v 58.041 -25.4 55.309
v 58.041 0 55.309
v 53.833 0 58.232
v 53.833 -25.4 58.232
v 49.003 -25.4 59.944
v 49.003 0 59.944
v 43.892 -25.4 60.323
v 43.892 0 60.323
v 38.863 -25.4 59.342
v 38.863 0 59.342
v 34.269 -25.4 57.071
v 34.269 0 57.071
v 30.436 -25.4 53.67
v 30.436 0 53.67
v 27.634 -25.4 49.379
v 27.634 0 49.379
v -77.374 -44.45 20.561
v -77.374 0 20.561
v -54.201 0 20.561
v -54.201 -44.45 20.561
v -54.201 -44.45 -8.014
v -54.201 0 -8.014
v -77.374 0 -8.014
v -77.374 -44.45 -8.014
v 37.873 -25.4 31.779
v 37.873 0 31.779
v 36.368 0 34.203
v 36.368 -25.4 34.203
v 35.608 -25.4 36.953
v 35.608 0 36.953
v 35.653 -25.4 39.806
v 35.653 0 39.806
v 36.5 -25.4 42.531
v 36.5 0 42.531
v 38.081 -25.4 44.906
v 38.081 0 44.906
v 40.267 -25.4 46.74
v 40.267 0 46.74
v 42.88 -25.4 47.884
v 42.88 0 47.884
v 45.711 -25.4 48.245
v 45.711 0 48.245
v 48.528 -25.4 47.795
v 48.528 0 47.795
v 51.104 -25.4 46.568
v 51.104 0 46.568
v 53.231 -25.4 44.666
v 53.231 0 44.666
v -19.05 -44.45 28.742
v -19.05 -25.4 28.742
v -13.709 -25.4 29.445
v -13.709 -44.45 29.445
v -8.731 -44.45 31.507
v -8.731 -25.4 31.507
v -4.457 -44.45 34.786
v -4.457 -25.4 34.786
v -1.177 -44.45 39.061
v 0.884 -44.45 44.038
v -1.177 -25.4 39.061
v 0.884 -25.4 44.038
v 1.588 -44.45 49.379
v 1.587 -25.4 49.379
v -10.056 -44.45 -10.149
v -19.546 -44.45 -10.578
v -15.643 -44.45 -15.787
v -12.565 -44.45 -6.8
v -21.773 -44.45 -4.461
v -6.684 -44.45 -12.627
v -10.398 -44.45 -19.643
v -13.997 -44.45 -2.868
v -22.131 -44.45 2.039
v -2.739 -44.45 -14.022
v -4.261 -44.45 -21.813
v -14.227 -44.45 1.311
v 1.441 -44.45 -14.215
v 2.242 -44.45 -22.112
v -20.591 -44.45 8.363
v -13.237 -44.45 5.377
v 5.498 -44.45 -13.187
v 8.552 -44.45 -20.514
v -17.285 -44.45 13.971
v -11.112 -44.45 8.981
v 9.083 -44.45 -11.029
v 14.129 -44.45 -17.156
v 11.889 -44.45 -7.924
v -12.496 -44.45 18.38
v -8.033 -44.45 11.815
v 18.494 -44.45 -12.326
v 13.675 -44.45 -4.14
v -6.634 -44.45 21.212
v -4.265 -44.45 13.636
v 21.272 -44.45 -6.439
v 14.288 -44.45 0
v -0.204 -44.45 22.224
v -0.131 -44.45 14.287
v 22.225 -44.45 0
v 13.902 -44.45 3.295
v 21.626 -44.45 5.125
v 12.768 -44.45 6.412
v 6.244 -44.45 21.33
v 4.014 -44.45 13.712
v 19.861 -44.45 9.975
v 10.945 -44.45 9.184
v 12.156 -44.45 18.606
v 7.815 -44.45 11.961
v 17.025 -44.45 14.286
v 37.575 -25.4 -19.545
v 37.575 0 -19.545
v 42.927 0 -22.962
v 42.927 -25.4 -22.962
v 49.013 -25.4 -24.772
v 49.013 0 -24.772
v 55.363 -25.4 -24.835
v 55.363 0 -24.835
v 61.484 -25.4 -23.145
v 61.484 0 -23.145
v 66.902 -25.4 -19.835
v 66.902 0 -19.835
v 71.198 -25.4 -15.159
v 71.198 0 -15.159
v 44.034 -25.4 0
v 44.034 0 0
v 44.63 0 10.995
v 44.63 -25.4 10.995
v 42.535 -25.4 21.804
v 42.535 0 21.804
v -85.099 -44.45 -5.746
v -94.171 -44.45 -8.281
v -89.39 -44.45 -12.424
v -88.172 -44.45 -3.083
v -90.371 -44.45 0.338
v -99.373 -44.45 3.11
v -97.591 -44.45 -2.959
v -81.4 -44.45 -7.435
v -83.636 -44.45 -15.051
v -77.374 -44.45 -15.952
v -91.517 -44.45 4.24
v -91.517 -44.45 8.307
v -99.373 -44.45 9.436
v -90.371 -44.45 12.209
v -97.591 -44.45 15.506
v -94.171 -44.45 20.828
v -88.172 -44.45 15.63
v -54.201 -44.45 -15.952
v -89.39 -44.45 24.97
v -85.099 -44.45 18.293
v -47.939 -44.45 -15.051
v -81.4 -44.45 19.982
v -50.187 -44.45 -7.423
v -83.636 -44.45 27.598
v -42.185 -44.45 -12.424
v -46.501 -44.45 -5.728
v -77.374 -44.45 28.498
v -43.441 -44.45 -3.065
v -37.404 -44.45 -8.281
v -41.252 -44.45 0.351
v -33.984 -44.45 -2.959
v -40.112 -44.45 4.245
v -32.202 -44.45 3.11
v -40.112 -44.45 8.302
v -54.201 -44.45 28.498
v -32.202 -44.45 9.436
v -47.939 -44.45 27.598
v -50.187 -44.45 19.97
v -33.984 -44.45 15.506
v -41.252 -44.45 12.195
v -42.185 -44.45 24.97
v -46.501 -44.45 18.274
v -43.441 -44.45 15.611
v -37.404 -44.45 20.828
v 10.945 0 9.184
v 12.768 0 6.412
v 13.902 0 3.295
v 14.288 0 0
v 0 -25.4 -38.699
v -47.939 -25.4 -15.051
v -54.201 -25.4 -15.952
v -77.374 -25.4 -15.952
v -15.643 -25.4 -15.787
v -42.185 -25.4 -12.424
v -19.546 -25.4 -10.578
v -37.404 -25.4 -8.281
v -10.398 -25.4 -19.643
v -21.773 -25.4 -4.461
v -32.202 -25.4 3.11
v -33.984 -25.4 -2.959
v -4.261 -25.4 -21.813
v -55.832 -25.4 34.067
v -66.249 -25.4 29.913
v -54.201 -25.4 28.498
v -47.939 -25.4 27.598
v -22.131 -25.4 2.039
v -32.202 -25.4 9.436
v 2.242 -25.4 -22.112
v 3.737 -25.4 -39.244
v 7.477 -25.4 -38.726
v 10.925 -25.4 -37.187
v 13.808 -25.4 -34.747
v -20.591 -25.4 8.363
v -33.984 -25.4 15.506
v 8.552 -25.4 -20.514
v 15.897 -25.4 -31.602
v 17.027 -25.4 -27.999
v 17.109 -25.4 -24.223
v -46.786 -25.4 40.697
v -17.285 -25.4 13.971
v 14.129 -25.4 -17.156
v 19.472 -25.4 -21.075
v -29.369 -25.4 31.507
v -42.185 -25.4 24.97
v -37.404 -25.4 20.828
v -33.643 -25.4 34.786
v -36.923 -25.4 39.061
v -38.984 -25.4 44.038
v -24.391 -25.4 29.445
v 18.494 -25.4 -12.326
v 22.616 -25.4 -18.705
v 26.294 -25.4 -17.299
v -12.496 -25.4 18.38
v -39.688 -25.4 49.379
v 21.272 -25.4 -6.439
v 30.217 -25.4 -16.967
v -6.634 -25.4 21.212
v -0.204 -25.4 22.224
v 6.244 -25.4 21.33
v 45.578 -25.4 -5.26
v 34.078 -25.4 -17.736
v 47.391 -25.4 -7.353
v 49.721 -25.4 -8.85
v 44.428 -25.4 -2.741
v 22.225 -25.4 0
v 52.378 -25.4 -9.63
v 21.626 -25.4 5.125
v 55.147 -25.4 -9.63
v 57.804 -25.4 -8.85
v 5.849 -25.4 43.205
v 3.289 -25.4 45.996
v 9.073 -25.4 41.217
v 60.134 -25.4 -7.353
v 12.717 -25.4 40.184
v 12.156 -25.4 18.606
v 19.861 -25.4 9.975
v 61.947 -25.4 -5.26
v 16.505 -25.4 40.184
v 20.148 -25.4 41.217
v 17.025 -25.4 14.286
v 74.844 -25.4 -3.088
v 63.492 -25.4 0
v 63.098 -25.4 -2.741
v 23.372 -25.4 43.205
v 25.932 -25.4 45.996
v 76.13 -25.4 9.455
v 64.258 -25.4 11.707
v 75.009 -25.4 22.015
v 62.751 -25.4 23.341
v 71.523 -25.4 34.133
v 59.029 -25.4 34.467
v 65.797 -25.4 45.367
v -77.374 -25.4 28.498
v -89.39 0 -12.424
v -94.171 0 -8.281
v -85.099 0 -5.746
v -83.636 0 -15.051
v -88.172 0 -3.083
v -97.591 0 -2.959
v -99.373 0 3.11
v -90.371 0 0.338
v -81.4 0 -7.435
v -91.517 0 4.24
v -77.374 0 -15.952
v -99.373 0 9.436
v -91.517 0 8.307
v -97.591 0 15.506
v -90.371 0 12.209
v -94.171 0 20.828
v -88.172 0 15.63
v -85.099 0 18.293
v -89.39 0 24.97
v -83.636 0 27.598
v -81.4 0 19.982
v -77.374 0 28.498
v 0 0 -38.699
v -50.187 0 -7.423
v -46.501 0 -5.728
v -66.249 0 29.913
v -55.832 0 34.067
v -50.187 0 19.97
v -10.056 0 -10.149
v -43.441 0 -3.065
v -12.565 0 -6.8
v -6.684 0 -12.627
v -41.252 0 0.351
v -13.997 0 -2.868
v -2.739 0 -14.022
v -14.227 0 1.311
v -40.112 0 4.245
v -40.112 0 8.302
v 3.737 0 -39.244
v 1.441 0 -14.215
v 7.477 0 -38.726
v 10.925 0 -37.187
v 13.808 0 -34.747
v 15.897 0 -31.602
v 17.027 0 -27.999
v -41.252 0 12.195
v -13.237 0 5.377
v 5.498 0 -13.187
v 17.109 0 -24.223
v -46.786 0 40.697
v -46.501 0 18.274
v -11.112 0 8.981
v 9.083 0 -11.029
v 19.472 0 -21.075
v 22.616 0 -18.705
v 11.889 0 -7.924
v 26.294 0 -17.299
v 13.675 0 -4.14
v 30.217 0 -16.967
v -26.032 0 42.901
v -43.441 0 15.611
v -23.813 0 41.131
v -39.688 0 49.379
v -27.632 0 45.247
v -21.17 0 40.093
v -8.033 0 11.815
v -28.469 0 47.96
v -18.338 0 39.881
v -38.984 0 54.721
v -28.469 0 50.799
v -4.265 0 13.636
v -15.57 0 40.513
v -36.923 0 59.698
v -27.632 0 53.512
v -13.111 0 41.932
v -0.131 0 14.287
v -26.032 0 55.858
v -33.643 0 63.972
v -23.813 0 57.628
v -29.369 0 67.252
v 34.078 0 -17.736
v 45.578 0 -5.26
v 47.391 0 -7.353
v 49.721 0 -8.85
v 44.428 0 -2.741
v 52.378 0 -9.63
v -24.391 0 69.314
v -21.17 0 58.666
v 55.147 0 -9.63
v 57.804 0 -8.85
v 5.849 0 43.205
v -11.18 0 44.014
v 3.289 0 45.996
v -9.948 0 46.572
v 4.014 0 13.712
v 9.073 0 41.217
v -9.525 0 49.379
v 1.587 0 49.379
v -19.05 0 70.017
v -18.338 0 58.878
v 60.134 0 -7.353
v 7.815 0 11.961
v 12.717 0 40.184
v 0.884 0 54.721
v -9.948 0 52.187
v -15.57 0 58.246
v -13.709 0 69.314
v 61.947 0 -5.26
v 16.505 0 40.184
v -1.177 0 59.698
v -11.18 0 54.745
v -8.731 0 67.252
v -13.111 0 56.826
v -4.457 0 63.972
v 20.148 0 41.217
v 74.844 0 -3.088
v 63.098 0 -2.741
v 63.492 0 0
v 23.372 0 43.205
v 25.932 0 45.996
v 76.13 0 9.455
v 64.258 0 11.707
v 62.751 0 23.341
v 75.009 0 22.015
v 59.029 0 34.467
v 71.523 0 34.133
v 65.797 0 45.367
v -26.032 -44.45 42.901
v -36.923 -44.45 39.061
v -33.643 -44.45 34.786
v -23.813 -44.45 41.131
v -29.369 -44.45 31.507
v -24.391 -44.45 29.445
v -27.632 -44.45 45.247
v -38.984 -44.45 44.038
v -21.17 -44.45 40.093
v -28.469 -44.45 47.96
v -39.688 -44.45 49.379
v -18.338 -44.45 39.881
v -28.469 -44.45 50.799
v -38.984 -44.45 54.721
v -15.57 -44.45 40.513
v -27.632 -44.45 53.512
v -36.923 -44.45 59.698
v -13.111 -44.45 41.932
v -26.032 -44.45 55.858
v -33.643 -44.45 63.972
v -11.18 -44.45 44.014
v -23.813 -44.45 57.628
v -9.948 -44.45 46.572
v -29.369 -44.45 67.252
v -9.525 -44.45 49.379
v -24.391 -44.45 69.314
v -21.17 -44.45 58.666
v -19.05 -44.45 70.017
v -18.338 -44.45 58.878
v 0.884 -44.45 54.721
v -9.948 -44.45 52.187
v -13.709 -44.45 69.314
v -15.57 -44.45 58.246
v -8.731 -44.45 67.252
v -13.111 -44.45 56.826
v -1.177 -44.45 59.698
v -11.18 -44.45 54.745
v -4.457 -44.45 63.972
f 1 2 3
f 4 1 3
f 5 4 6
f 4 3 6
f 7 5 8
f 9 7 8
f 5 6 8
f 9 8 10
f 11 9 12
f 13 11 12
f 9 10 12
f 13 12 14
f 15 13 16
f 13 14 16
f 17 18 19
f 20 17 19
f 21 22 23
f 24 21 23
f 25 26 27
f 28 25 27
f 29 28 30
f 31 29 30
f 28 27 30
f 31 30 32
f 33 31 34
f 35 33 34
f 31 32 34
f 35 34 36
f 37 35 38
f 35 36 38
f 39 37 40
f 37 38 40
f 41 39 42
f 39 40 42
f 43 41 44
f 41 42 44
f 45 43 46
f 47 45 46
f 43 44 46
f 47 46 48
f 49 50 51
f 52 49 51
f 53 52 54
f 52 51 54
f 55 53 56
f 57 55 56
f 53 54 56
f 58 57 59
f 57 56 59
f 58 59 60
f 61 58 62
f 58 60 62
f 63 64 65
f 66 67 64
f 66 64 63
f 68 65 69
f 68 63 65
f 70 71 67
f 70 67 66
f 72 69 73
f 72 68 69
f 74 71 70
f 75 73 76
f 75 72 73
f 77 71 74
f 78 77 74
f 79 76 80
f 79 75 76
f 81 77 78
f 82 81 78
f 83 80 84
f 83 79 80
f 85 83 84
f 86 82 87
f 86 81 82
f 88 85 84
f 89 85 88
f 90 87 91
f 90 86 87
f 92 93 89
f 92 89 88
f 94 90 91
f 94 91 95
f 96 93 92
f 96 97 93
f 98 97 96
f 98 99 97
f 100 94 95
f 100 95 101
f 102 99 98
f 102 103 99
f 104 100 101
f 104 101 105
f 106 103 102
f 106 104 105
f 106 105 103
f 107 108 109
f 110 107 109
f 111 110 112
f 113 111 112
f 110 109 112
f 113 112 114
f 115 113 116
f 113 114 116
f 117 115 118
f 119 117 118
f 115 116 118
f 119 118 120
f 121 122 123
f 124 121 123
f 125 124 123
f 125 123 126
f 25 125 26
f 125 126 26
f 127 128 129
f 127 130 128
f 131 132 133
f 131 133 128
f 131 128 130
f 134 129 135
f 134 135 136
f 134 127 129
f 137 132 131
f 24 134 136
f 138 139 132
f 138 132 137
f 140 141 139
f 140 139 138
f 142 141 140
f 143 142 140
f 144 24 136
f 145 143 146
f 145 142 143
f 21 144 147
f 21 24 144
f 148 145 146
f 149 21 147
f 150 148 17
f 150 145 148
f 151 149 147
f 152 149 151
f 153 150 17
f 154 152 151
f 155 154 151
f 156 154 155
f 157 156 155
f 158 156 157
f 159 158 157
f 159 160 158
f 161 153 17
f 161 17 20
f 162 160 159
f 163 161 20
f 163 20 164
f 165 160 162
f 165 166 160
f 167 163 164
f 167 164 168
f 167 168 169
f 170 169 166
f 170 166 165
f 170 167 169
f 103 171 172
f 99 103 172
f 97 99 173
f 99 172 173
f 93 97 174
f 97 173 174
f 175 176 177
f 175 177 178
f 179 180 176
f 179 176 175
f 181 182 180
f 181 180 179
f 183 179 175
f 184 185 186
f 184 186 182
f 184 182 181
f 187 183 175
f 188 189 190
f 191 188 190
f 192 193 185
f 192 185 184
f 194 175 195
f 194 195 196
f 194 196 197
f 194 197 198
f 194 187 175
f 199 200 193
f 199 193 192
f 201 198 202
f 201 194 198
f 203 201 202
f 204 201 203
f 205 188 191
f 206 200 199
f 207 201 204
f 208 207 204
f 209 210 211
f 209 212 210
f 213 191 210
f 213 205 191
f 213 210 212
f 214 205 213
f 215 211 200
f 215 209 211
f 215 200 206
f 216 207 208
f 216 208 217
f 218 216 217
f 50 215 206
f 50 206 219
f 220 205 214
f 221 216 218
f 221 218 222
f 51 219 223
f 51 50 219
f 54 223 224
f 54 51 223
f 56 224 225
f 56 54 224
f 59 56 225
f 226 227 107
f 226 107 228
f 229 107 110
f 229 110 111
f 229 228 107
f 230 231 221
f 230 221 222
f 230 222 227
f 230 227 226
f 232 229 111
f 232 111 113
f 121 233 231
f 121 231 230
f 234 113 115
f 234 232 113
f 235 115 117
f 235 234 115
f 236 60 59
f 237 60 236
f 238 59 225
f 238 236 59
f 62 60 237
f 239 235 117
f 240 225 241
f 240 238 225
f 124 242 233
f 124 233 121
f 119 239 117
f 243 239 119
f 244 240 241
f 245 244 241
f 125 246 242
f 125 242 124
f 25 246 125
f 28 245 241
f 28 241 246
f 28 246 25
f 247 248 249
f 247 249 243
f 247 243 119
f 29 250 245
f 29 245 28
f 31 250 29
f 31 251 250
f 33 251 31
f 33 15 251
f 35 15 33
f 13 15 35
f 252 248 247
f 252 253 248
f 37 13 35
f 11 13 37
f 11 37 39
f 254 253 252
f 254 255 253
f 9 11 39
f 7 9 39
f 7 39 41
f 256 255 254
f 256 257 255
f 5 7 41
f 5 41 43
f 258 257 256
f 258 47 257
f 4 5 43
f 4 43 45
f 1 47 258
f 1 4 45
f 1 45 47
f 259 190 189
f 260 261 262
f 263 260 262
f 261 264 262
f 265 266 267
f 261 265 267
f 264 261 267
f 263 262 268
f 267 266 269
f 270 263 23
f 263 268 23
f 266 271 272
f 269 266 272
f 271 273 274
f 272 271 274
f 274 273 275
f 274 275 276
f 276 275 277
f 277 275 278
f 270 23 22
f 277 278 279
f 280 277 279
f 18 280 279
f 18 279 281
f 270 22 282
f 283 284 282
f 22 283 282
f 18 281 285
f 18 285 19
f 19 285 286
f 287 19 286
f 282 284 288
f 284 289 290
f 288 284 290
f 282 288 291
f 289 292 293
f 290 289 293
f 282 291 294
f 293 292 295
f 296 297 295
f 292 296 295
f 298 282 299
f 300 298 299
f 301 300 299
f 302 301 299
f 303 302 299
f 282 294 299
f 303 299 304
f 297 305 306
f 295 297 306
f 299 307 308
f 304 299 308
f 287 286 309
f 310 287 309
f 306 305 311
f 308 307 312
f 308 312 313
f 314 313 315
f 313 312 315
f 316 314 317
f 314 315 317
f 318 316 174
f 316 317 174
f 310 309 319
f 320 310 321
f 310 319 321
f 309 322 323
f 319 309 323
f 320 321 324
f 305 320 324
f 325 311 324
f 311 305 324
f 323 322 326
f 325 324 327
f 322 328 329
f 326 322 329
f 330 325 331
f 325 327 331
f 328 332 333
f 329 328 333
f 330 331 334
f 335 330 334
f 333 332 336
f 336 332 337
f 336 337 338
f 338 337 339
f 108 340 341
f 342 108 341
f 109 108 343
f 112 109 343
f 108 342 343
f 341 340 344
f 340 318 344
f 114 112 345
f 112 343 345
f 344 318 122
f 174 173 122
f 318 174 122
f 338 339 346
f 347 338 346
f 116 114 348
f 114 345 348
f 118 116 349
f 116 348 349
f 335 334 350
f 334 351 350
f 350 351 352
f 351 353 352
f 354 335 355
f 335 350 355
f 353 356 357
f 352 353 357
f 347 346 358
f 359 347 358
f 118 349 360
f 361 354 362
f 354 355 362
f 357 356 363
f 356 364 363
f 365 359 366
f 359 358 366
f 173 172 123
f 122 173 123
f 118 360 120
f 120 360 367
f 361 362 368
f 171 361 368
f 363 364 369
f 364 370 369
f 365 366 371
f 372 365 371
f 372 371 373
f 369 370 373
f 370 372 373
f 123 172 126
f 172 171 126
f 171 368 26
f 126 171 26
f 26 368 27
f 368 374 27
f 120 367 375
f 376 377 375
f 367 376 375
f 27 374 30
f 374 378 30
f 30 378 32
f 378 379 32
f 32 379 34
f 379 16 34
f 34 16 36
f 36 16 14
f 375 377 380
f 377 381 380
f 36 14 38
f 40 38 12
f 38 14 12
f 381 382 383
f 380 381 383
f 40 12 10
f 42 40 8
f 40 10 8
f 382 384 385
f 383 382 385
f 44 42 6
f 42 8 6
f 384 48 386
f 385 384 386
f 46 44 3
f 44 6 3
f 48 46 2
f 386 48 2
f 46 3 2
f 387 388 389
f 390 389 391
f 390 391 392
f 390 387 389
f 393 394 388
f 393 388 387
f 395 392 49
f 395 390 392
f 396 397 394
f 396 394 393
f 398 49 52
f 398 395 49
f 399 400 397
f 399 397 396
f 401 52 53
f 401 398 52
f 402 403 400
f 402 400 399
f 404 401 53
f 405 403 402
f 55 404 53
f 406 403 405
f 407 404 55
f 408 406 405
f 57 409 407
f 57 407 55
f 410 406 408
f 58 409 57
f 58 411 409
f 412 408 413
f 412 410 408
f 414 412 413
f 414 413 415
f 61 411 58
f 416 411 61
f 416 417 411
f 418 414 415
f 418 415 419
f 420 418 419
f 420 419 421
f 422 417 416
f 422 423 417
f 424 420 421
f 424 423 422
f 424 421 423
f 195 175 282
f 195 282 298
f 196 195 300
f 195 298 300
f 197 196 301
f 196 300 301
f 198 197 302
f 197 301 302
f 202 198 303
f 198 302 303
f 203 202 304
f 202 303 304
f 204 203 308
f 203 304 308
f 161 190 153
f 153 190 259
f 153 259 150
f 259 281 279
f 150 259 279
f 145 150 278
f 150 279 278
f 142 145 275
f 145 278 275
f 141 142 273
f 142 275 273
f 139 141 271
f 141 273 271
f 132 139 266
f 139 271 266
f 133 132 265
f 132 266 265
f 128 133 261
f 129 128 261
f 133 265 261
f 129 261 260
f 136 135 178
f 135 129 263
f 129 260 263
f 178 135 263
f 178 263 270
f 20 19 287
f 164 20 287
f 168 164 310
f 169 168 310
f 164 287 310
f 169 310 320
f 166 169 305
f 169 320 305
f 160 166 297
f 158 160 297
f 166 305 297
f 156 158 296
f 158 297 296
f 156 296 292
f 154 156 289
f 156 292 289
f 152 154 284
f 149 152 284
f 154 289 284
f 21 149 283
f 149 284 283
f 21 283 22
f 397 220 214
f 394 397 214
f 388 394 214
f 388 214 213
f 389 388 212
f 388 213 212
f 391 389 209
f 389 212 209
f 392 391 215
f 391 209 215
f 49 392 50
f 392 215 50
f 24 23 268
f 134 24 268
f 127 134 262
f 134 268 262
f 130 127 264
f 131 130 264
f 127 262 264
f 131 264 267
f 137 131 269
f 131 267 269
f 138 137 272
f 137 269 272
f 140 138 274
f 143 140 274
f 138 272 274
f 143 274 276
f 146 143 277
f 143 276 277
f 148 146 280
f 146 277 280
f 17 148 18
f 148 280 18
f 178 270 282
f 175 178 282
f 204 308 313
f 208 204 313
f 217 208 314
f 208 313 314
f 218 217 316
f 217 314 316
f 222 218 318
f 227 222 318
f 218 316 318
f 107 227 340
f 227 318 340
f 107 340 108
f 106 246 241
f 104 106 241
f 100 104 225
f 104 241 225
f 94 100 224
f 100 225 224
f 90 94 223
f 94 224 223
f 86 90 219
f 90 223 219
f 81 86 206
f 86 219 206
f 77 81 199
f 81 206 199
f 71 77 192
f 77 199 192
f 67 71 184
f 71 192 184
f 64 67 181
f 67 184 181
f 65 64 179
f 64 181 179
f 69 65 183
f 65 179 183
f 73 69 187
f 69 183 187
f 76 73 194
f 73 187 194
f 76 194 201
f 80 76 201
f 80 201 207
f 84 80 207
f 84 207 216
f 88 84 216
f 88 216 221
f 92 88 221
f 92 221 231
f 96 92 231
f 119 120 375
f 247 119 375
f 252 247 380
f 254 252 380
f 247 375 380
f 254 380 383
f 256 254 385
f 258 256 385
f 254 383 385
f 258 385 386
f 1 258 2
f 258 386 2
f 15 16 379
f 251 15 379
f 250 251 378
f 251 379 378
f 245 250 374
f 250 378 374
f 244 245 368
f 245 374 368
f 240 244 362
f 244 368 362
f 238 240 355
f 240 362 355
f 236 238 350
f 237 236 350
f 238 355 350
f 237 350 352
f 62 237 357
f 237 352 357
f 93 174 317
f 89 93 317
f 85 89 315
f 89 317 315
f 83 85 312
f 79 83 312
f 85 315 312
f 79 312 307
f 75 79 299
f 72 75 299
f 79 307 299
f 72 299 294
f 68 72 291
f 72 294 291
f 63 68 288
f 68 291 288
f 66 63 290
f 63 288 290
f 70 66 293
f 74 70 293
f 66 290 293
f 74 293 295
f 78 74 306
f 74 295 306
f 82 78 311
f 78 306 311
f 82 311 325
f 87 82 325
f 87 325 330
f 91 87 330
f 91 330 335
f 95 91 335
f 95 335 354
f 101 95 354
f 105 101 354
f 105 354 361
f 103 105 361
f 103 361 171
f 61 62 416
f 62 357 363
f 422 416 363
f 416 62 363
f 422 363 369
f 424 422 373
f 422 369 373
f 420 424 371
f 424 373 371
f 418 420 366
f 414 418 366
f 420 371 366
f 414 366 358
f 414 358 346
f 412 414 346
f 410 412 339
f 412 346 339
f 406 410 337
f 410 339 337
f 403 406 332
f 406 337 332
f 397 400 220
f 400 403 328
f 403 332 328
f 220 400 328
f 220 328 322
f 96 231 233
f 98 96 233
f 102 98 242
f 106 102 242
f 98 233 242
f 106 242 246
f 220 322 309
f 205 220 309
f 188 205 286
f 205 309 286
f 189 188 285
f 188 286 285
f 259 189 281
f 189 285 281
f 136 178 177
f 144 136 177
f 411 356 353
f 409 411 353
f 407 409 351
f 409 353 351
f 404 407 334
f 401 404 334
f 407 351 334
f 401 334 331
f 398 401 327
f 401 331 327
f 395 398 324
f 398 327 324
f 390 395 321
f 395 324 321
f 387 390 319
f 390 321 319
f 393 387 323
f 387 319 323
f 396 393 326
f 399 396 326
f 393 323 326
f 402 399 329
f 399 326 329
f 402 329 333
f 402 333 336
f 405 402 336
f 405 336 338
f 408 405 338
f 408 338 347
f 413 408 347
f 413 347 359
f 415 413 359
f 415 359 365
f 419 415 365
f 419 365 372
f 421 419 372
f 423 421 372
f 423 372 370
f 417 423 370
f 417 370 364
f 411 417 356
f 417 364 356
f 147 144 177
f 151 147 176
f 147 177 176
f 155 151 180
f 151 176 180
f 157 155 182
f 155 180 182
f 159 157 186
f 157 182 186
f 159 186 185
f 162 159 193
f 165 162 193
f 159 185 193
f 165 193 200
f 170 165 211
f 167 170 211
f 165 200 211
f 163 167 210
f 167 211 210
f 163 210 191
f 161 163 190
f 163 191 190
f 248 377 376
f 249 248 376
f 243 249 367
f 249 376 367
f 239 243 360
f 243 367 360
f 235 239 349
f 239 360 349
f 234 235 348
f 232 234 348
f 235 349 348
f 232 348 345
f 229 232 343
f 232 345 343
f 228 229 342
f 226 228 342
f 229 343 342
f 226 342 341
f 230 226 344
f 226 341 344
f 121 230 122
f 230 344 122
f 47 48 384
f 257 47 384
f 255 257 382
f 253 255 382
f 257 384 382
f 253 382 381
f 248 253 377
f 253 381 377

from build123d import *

# Parameters (mm, degrees)
F1_DEPTH = 25.4
F2_DEPTH = 44.45


with BuildPart() as f1:
    # F0 (on Front) → F1 (new body)
    with BuildSketch(Plane.XZ):
        with BuildLine():
            ThreePointArc((-39.6875, 49.3794158101), (-55.8319208878, 34.0674673207), (-77.3744968308, 28.4983099266))
            Line((-77.3744968308, 28.4983099266), (-54.2009934255, 28.4983099266))
            ThreePointArc((-54.2009934255, 28.4983099266), (-31.9759934255, 6.2733099266), (-54.2009934255, -15.9516900734))
            Line((-54.2009934255, -15.9516900734), (-77.3744968308, -15.9516900734))
            Line((-77.3744968308, -15.9516900734), (0, -38.6990942061))
            ThreePointArc((0, -38.6990942061), (12.4529146016, -36.068931174), (17.1085186303, -24.2233332247))
            ThreePointArc((17.1085186303, -24.2233332247), (26.2935862442, -17.2988786691), (37.5749282539, -19.544955343))
            ThreePointArc((37.5749282539, -19.544955343), (55.3627118113, -24.8347783768), (71.1983144283, -15.1589754969))
            ThreePointArc((71.1983144283, -15.1589754969), (75.0092778843, 22.014859432), (58.0413416028, 55.3091019392))
            ThreePointArc((58.0413416028, 55.3091019392), (41.3447910775, 59.999957233), (27.6341009885, 49.3794158101))
            ThreePointArc((27.6341009885, 49.3794158101), (14.6108004943, 40.0533008844), (1.5875, 49.3794158101))
            ThreePointArc((1.5875, 49.3794158101), (-4.4570838033, 34.7864996134), (-19.05, 28.7419158101))
            ThreePointArc((-19.05, 28.7419158101), (-33.6429161967, 34.7864996134), (-39.6875, 49.3794158101))
        make_face()
        with BuildLine():
            Line((44.0335609019, 0), (22.225, 0))
            ThreePointArc((22.225, 0), (-20.884668497, -7.6013976854), (17.0253377483, 14.2859546253))
            Line((17.0253377483, 14.2859546253), (37.8725077884, 31.778807317))
            ThreePointArc((37.8725077884, 31.778807317), (39.1080816416, 45.9014810832), (53.2307554079, 44.66590723))
            ThreePointArc((53.2307554079, 44.66590723), (62.7513822269, 23.341485137), (63.4919119209, 0))
            ThreePointArc((63.4919119209, 0), (53.7627364114, -9.7291755095), (44.0335609019, 0))
        make_face(mode=Mode.SUBTRACT)
        with BuildLine():
            ThreePointArc((17.0253377483, 14.2859546253), (20.884668497, 7.6013976854), (22.225, 0))
            Line((22.225, 0), (44.0335609019, 0))
            ThreePointArc((44.0335609019, 0), (43.9151265207, 16.4636733924), (37.8725077884, 31.778807317))
            Line((37.8725077884, 31.778807317), (17.0253377483, 14.2859546253))
        make_face()
    extrude(amount=F1_DEPTH)

    # F0 (on Front) → F2 (join)
    with BuildSketch(Plane.XZ):
        with BuildLine():
            ThreePointArc((-19.05, 70.0169158101), (-33.6429161967, 63.9723320068), (-39.6875, 49.3794158101))
            ThreePointArc((-39.6875, 49.3794158101), (-33.6429161967, 34.7864996134), (-19.05, 28.7419158101))
            Line((-19.05, 28.7419158101), (-19.05, 39.8544158101))
            ThreePointArc((-19.05, 39.8544158101), (-28.575, 49.3794158101), (-19.05, 58.9044158101))
            Line((-19.05, 58.9044158101), (-19.05, 70.0169158101))
        make_face()
        with BuildLine():
            ThreePointArc((1.5875, 49.3794158101), (-4.4570838033, 63.9723320068), (-19.05, 70.0169158101))
            Line((-19.05, 70.0169158101), (-19.05, 58.9044158101))
            ThreePointArc((-19.05, 58.9044158101), (-12.3148079092, 56.1146079009), (-9.525, 49.3794158101))
            Line((-9.525, 49.3794158101), (1.5875, 49.3794158101))
        make_face()
        with BuildLine():
            Line((-19.05, 39.8544158101), (-19.05, 28.7419158101))
            ThreePointArc((-19.05, 28.7419158101), (-4.4570838033, 34.7864996134), (1.5875, 49.3794158101))
            Line((1.5875, 49.3794158101), (-9.525, 49.3794158101))
            ThreePointArc((-9.525, 49.3794158101), (-12.3148079092, 42.6442237193), (-19.05, 39.8544158101))
        make_face()
        with BuildLine():
            Line((-54.2009934255, 28.4983099266), (-77.3744968308, 28.4983099266))
            ThreePointArc((-77.3744968308, 28.4983099266), (-99.5994968308, 6.2733099266), (-77.3744968308, -15.9516900734))
            Line((-77.3744968308, -15.9516900734), (-54.2009934255, -15.9516900734))
            ThreePointArc((-54.2009934255, -15.9516900734), (-31.9759934255, 6.2733099266), (-54.2009934255, 28.4983099266))
        make_face()
        with BuildLine():
            ThreePointArc((-77.3744968308, -8.0141900734), (-91.6619968308, 6.2733099266), (-77.3744968308, 20.5608099266))
            Line((-77.3744968308, 20.5608099266), (-54.2009934255, 20.5608099266))
            ThreePointArc((-54.2009934255, 20.5608099266), (-39.9668250993, 6.2733099266), (-54.2009934255, -8.0141900734))
            Line((-54.2009934255, -8.0141900734), (-77.3744968308, -8.0141900734))
        make_face(mode=Mode.SUBTRACT)
        with BuildLine():
            Line((22.225, 0), (14.2875, 0))
            ThreePointArc((14.2875, 0), (-13.4258583195, -4.8866127978), (10.9448599811, 9.1838279734))
            Line((10.9448599811, 9.1838279734), (17.0253377483, 14.2859546253))
            ThreePointArc((17.0253377483, 14.2859546253), (-20.884668497, -7.6013976854), (22.225, 0))
        make_face()
        with BuildLine():
            ThreePointArc((10.9448599811, 9.1838279734), (13.4258583195, 4.8866127978), (14.2875, 0))
            Line((14.2875, 0), (22.225, 0))
            ThreePointArc((22.225, 0), (20.884668497, 7.6013976854), (17.0253377483, 14.2859546253))
            Line((17.0253377483, 14.2859546253), (10.9448599811, 9.1838279734))
        make_face()
    extrude(amount=F2_DEPTH)


solid = f1.part
